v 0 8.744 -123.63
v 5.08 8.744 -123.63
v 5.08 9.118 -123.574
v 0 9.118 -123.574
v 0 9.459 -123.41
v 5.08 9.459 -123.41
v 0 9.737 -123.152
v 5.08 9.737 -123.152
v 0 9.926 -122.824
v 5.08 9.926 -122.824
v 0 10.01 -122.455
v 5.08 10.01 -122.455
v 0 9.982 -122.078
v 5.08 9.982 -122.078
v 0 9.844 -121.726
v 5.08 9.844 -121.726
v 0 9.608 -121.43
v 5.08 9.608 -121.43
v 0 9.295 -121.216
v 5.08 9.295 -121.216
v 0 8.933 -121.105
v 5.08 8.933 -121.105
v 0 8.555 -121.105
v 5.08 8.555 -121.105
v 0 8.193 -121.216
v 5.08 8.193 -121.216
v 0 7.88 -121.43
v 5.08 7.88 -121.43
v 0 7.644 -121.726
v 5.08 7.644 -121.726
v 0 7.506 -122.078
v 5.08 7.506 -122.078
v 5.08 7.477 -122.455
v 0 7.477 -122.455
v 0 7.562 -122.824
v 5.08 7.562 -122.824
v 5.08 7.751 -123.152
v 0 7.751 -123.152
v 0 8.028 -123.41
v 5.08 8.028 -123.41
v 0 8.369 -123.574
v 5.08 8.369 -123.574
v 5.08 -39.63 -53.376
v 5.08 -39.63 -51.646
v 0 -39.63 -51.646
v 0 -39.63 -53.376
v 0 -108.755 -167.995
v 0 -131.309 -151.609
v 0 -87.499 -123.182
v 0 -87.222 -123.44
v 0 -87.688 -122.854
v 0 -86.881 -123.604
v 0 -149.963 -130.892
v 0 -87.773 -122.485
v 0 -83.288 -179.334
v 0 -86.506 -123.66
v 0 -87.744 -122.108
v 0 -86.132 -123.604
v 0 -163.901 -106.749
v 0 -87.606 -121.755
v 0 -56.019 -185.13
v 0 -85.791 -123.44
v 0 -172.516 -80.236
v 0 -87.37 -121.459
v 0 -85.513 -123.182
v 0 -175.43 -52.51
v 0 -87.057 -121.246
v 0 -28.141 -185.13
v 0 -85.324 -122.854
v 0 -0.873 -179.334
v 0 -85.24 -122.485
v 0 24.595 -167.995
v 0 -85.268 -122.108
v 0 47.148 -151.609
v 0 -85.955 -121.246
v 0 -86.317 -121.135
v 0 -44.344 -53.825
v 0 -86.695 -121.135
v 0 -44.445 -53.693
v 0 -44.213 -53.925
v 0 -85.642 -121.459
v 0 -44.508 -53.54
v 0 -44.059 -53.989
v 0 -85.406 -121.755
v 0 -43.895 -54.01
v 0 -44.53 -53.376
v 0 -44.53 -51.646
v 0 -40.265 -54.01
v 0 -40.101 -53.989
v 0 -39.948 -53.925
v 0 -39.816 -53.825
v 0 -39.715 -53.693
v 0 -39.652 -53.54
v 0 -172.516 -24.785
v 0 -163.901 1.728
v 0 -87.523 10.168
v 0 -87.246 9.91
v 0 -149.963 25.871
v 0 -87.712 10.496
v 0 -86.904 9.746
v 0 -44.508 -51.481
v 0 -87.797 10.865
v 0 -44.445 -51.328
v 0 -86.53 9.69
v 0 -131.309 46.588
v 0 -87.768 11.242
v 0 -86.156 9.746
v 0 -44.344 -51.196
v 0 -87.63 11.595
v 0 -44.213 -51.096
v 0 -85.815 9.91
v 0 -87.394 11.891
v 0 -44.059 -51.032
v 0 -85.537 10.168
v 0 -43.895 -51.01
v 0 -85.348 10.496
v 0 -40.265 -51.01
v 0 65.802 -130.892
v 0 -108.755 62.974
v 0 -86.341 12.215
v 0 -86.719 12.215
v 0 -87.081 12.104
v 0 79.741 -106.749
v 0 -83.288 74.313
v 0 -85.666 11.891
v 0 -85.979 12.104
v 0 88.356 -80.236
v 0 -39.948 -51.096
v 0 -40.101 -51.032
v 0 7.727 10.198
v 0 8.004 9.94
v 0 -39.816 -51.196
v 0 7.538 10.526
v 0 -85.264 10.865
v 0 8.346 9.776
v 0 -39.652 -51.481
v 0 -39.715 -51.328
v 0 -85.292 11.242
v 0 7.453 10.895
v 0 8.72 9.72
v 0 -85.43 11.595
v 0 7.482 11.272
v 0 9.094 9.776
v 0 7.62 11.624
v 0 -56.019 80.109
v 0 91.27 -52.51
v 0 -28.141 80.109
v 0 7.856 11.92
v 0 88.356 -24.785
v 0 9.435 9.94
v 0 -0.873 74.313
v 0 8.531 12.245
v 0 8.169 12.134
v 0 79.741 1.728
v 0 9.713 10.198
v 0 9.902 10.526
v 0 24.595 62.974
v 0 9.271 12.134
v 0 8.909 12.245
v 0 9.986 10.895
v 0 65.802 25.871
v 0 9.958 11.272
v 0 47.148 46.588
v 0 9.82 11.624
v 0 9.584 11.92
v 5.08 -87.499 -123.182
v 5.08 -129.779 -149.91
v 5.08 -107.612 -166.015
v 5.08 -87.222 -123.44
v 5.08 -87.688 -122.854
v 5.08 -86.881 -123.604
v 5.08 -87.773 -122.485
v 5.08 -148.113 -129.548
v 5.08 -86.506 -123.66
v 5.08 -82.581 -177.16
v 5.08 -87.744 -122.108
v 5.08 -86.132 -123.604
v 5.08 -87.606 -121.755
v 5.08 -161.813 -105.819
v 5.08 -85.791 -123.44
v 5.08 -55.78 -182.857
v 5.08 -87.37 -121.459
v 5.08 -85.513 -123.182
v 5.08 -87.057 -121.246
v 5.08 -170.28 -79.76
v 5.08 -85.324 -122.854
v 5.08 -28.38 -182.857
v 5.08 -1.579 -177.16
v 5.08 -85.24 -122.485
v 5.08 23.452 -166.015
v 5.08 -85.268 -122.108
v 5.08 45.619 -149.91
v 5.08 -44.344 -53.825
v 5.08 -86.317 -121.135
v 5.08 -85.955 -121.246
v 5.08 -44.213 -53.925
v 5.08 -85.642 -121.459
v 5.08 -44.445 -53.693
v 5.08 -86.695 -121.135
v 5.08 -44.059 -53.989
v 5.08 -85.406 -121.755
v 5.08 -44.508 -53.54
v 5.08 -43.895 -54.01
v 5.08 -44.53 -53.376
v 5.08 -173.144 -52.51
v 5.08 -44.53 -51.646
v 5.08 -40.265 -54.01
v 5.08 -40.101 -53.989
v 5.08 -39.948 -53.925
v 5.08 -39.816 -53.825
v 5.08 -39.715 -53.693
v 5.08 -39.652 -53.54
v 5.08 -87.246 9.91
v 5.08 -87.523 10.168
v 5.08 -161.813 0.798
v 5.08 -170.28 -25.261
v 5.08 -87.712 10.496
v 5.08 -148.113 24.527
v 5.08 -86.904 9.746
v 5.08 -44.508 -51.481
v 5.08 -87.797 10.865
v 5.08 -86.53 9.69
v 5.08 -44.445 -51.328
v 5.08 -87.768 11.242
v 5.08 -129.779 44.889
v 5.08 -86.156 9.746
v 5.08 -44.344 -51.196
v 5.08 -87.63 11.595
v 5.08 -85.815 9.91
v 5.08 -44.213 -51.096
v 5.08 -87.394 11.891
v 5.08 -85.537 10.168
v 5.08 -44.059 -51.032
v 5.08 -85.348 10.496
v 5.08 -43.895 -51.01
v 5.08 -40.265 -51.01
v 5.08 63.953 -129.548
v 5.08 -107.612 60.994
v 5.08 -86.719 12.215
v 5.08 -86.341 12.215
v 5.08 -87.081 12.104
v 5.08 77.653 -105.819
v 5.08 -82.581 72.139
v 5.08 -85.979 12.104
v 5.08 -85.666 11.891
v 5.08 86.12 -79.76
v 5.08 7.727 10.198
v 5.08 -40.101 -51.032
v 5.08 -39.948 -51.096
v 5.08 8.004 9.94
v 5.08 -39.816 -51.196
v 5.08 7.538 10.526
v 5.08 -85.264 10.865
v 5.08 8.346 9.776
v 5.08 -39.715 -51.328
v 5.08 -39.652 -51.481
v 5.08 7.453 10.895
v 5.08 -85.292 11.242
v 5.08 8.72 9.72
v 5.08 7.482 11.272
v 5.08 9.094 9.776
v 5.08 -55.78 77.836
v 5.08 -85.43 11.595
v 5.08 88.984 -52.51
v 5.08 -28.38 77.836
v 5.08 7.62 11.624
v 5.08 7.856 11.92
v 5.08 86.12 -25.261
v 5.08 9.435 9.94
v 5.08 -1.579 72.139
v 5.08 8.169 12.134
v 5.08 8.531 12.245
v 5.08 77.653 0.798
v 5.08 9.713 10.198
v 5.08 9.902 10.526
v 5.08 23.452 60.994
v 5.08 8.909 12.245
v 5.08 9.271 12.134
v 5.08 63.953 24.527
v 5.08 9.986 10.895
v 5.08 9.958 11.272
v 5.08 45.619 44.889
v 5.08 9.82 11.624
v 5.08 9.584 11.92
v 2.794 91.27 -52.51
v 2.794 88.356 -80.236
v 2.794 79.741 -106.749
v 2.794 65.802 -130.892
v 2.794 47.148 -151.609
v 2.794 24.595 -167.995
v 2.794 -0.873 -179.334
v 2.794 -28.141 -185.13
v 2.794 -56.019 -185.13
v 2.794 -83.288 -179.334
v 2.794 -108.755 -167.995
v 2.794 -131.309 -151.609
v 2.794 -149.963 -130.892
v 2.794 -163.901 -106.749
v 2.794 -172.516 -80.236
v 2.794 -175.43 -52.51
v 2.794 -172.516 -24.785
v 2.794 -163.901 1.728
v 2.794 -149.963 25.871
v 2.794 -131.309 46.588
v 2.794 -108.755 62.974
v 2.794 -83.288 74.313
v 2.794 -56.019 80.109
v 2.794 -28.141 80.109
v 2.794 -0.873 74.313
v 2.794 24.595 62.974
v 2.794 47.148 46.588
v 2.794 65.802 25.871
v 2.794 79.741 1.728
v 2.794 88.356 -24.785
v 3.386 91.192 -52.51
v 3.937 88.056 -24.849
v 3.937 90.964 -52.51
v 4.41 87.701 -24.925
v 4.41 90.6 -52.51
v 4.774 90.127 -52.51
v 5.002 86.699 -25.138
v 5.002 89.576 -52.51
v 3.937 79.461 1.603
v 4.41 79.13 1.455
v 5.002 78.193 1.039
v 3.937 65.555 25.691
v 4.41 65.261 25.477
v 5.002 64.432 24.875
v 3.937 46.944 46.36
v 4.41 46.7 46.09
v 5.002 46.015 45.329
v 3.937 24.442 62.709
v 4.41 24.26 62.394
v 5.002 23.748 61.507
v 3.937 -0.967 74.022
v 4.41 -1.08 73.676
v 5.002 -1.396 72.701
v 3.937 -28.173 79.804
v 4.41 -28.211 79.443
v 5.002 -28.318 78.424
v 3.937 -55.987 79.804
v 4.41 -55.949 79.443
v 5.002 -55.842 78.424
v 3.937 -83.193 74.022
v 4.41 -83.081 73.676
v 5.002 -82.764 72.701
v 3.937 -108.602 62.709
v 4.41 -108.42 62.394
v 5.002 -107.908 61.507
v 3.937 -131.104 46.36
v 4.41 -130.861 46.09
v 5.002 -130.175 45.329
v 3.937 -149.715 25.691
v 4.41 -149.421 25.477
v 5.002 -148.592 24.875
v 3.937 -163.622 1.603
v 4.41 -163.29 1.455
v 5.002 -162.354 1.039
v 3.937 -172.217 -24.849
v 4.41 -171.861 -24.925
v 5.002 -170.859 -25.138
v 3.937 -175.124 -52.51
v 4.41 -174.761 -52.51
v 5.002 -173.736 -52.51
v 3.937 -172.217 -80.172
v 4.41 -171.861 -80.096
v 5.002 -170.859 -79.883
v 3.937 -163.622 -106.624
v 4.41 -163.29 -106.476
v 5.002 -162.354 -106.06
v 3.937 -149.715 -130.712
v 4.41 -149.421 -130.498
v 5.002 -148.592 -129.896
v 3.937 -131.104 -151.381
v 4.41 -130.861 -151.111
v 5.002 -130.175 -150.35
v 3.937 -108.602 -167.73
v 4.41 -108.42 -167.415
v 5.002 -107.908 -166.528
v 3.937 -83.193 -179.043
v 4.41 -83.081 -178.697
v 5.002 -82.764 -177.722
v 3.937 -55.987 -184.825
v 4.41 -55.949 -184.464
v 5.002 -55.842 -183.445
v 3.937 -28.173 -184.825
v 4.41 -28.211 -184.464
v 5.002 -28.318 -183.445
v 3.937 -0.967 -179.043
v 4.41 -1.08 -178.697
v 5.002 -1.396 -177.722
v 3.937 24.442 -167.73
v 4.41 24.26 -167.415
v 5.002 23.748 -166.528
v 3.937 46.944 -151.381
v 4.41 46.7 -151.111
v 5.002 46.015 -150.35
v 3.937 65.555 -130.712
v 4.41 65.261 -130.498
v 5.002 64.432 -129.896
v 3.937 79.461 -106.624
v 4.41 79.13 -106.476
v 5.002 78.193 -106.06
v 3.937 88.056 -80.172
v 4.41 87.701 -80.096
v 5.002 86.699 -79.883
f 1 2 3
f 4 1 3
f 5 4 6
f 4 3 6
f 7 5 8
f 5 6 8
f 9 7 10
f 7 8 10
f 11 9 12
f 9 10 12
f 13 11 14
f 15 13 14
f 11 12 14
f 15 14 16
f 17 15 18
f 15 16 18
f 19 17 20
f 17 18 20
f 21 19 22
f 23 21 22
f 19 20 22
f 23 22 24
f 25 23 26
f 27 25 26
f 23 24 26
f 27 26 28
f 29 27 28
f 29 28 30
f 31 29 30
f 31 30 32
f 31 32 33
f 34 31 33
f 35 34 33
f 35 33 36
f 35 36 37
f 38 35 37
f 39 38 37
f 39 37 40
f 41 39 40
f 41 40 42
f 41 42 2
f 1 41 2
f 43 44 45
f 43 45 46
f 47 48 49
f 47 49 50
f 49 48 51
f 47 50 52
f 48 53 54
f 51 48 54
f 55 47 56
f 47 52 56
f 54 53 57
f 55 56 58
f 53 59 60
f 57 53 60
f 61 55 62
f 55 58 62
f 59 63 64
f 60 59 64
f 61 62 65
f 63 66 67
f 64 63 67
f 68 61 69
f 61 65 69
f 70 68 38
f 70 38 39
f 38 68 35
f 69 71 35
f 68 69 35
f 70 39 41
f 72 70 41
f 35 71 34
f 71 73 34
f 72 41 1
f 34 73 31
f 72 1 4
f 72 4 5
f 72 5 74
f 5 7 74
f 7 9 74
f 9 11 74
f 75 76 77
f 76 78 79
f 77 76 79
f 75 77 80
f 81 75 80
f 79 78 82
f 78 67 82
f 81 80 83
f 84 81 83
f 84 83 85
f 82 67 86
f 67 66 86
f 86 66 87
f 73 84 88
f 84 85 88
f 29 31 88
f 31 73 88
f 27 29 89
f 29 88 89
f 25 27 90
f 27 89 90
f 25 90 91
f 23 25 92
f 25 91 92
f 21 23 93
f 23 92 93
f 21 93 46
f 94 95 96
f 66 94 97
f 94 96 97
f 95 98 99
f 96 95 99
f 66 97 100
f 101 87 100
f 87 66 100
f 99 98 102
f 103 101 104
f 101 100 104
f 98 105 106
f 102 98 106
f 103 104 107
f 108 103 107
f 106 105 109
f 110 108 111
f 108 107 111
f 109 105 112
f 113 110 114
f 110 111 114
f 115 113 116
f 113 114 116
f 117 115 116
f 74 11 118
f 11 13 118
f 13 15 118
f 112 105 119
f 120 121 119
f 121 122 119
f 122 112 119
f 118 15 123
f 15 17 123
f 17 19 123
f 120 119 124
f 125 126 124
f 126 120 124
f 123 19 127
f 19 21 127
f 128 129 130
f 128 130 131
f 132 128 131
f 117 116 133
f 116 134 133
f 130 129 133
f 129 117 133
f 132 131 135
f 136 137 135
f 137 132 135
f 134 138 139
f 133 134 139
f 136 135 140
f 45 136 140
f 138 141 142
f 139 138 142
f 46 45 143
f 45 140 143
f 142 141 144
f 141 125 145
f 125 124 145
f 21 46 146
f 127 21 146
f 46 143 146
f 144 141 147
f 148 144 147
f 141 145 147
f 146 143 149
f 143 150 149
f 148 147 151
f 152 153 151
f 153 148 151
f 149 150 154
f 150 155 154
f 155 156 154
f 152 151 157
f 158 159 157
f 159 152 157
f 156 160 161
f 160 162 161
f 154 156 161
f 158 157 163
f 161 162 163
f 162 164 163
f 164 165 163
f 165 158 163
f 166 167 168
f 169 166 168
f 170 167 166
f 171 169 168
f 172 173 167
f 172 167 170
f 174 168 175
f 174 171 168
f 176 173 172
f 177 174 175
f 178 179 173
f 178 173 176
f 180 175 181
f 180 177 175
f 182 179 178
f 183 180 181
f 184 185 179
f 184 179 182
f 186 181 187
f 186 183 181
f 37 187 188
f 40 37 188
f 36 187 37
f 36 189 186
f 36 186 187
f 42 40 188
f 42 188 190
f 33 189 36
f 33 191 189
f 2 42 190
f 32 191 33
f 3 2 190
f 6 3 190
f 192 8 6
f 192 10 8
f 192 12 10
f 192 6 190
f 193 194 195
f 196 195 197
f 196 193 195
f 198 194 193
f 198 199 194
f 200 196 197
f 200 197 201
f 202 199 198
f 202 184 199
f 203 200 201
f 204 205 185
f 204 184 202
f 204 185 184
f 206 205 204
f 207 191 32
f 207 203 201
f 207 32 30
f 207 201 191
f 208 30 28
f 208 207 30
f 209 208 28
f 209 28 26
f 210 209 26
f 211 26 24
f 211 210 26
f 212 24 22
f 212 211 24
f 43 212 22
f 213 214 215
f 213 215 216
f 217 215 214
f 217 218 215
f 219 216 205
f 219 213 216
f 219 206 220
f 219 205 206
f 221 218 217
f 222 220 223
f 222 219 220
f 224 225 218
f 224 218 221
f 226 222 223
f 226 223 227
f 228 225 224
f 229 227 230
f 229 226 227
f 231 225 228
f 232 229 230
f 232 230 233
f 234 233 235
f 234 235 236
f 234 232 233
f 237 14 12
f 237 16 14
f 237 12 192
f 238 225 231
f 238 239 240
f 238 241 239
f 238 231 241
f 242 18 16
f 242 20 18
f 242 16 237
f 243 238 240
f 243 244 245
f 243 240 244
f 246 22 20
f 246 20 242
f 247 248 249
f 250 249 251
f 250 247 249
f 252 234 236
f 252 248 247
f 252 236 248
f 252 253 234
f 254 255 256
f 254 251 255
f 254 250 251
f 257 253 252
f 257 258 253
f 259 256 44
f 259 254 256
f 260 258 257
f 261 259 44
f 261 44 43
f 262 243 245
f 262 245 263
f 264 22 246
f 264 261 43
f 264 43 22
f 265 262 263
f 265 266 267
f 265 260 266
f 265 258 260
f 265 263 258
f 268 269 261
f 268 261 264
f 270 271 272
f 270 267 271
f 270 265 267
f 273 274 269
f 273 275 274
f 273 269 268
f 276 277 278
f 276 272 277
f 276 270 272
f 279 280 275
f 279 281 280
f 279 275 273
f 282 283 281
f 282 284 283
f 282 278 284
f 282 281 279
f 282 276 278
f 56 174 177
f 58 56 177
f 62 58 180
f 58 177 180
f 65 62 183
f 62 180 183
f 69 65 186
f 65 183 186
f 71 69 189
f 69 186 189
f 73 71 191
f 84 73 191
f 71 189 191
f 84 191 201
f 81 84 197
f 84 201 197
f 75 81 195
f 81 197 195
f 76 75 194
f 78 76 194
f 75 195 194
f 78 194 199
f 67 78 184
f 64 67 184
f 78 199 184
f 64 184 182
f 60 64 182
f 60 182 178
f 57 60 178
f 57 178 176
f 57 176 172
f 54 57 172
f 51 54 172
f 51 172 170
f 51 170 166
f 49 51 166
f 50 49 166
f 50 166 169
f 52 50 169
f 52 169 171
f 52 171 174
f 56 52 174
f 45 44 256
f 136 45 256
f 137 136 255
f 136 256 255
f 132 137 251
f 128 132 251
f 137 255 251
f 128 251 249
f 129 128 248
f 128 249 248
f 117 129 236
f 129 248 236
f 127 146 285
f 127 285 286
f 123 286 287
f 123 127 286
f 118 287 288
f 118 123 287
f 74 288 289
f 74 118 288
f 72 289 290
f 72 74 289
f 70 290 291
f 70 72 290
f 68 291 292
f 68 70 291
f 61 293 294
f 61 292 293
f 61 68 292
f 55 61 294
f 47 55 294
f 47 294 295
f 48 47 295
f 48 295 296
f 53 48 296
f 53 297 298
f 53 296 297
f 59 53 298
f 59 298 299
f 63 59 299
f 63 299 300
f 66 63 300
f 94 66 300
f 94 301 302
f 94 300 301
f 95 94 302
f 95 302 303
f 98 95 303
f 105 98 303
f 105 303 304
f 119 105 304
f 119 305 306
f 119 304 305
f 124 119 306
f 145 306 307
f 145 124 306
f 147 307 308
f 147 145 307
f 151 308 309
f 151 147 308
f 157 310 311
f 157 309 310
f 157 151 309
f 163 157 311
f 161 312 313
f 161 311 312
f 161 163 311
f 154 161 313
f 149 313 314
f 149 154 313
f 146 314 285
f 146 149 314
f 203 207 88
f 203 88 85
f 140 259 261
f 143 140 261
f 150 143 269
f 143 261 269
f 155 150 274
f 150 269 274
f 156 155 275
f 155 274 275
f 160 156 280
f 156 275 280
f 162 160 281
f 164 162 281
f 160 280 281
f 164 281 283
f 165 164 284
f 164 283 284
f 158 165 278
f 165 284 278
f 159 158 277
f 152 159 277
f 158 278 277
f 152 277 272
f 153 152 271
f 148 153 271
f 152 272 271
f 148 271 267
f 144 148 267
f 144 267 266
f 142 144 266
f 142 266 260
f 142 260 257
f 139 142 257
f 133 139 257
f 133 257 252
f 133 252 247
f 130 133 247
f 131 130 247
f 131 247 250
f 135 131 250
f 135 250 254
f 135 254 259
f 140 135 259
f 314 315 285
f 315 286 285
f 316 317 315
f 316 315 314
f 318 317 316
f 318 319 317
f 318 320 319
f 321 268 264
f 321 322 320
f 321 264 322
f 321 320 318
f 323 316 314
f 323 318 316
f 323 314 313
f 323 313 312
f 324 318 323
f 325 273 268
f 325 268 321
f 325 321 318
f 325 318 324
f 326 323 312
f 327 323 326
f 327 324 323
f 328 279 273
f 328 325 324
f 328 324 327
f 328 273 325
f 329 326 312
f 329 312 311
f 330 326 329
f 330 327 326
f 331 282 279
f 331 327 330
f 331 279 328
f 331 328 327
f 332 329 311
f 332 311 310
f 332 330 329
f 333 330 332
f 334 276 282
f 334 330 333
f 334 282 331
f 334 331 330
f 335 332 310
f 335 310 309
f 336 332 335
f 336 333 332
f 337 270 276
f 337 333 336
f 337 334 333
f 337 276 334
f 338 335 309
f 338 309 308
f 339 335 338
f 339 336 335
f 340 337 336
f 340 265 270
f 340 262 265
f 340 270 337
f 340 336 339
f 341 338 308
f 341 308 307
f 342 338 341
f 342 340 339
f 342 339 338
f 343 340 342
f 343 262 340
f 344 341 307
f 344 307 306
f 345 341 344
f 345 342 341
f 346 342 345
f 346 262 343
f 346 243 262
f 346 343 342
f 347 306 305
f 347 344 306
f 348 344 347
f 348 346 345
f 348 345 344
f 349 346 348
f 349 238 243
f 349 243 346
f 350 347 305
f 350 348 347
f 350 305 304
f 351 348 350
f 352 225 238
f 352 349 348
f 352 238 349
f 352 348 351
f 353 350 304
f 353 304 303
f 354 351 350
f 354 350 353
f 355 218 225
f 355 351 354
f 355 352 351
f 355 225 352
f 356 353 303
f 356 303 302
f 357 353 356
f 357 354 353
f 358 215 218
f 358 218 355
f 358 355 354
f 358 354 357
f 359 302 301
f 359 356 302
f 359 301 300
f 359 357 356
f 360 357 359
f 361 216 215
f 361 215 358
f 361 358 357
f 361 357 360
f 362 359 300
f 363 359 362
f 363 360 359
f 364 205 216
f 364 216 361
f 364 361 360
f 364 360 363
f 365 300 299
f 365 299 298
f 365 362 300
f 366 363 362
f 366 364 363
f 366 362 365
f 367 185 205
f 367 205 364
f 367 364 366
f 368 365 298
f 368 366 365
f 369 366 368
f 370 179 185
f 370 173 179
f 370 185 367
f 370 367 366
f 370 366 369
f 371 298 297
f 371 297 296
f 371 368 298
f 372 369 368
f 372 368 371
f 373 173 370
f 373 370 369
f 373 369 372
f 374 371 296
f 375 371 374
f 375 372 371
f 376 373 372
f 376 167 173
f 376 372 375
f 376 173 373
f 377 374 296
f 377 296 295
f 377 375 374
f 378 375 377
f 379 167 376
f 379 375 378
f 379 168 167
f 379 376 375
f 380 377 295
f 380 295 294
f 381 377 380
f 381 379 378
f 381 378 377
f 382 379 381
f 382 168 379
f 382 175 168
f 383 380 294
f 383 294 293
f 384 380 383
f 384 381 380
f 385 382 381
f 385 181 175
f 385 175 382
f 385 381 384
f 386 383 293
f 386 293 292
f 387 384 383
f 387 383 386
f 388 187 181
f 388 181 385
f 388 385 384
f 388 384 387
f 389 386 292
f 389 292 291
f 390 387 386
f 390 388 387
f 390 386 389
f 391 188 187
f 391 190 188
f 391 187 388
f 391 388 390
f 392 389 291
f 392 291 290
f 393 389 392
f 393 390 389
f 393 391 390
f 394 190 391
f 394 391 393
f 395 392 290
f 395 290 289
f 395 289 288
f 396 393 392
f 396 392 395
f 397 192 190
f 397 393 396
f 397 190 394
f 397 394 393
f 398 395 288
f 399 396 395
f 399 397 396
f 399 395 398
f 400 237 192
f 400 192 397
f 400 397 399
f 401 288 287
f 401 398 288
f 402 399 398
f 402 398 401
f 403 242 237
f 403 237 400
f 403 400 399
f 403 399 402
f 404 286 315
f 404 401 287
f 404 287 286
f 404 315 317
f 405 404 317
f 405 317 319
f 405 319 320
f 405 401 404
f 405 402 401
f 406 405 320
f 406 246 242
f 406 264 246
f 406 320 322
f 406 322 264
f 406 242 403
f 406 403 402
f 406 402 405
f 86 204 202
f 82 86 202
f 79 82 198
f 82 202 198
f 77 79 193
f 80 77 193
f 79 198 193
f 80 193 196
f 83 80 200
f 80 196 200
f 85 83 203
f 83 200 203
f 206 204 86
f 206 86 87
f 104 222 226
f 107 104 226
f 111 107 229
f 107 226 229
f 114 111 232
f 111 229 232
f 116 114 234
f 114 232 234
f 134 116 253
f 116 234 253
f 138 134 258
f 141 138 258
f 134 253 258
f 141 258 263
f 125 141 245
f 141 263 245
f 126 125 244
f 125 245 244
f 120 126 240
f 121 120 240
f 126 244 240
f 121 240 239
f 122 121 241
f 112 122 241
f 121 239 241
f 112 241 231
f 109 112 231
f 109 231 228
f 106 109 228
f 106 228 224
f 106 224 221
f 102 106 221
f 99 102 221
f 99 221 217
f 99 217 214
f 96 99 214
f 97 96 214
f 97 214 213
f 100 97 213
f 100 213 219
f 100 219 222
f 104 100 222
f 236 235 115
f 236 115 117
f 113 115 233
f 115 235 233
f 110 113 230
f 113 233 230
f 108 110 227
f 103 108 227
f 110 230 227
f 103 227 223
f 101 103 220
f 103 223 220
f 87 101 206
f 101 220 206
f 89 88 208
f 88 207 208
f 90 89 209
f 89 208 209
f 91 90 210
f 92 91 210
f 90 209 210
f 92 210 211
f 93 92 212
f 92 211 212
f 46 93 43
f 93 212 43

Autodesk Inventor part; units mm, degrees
ref_plane "YZ Plane" through (0, 0, 0) normal (1, 0, 0) x (0, 1, 0)
ref_plane "XZ Plane" through (0, 0, 0) normal (0, 1, 0) x (-1, 0, 0)
ref_plane "XY Plane" through (0, 0, 0) normal (0, 0, 1) x (1, 0, 0)
sketch "Sketch1" plane through (0, 0, 0) normal (1, 0, 0) x (0, 1, 0)
  circle A0 centre (-42.0801, -52.5105) radius 133.35
  dimension "d38" = 266.7
extrude "Extrusion1" add sketch "Sketch1" along normal blind 5.08
fillet "Fillet1" radius 2.286 1 edges at (5.08, -175.4301, -52.5105)
sketch "Sketch2" plane through (5.08, -42.0801, -52.5105) normal (1, 0, 0) x (0, 0, -1)
  line L0 (0.865, -2.45) -> (-0.865, -2.45)
  line L1 (-1.5, -1.815) -> (-1.5, 1.815)
  line L2 (-0.865, 2.45) -> (0.865, 2.45)
  line L3 (1.5, 1.815) -> (1.5, -1.815)
  line L4 (1.5, -2.45) -> (-1.5, 2.45) construction
  line L5 (-1.5, -2.45) -> (1.5, 2.45) construction
  arc A0 (-0.865, 2.45) -> (-1.5, 1.815) centre (-0.865, 1.815) ccw
  arc A1 (1.5, 1.815) -> (0.865, 2.45) centre (0.865, 1.815) ccw
  arc A2 (-1.5, -1.815) -> (-0.865, -2.45) centre (-0.865, -1.815) ccw
  arc A3 (0.865, -2.45) -> (1.5, -1.815) centre (0.865, -1.815) ccw
  point P0 (-52.5105, 42.0801)
  point P1 (0, 0)
extrude "Extrusion3" cut sketch "Sketch2" against normal blind 5.08
sketch "Sketch4" plane through (5.08, -42.0801, -52.5105) normal (1, 0, 0) x (0, 0, -1)
  circle A0 centre (-63.4701, -44.45) radius 1.27
  circle A1 centre (-63.5, 50.8) radius 1.27
  circle A2 centre (69.85, 50.8239) radius 1.27
  circle A3 centre (69.8799, -44.4261) radius 1.27
  point P0 (-52.5105, 42.0801)
extrude "Extrusion5" cut sketch "Sketch4" against normal through all
properties part number "Rotating Base"
